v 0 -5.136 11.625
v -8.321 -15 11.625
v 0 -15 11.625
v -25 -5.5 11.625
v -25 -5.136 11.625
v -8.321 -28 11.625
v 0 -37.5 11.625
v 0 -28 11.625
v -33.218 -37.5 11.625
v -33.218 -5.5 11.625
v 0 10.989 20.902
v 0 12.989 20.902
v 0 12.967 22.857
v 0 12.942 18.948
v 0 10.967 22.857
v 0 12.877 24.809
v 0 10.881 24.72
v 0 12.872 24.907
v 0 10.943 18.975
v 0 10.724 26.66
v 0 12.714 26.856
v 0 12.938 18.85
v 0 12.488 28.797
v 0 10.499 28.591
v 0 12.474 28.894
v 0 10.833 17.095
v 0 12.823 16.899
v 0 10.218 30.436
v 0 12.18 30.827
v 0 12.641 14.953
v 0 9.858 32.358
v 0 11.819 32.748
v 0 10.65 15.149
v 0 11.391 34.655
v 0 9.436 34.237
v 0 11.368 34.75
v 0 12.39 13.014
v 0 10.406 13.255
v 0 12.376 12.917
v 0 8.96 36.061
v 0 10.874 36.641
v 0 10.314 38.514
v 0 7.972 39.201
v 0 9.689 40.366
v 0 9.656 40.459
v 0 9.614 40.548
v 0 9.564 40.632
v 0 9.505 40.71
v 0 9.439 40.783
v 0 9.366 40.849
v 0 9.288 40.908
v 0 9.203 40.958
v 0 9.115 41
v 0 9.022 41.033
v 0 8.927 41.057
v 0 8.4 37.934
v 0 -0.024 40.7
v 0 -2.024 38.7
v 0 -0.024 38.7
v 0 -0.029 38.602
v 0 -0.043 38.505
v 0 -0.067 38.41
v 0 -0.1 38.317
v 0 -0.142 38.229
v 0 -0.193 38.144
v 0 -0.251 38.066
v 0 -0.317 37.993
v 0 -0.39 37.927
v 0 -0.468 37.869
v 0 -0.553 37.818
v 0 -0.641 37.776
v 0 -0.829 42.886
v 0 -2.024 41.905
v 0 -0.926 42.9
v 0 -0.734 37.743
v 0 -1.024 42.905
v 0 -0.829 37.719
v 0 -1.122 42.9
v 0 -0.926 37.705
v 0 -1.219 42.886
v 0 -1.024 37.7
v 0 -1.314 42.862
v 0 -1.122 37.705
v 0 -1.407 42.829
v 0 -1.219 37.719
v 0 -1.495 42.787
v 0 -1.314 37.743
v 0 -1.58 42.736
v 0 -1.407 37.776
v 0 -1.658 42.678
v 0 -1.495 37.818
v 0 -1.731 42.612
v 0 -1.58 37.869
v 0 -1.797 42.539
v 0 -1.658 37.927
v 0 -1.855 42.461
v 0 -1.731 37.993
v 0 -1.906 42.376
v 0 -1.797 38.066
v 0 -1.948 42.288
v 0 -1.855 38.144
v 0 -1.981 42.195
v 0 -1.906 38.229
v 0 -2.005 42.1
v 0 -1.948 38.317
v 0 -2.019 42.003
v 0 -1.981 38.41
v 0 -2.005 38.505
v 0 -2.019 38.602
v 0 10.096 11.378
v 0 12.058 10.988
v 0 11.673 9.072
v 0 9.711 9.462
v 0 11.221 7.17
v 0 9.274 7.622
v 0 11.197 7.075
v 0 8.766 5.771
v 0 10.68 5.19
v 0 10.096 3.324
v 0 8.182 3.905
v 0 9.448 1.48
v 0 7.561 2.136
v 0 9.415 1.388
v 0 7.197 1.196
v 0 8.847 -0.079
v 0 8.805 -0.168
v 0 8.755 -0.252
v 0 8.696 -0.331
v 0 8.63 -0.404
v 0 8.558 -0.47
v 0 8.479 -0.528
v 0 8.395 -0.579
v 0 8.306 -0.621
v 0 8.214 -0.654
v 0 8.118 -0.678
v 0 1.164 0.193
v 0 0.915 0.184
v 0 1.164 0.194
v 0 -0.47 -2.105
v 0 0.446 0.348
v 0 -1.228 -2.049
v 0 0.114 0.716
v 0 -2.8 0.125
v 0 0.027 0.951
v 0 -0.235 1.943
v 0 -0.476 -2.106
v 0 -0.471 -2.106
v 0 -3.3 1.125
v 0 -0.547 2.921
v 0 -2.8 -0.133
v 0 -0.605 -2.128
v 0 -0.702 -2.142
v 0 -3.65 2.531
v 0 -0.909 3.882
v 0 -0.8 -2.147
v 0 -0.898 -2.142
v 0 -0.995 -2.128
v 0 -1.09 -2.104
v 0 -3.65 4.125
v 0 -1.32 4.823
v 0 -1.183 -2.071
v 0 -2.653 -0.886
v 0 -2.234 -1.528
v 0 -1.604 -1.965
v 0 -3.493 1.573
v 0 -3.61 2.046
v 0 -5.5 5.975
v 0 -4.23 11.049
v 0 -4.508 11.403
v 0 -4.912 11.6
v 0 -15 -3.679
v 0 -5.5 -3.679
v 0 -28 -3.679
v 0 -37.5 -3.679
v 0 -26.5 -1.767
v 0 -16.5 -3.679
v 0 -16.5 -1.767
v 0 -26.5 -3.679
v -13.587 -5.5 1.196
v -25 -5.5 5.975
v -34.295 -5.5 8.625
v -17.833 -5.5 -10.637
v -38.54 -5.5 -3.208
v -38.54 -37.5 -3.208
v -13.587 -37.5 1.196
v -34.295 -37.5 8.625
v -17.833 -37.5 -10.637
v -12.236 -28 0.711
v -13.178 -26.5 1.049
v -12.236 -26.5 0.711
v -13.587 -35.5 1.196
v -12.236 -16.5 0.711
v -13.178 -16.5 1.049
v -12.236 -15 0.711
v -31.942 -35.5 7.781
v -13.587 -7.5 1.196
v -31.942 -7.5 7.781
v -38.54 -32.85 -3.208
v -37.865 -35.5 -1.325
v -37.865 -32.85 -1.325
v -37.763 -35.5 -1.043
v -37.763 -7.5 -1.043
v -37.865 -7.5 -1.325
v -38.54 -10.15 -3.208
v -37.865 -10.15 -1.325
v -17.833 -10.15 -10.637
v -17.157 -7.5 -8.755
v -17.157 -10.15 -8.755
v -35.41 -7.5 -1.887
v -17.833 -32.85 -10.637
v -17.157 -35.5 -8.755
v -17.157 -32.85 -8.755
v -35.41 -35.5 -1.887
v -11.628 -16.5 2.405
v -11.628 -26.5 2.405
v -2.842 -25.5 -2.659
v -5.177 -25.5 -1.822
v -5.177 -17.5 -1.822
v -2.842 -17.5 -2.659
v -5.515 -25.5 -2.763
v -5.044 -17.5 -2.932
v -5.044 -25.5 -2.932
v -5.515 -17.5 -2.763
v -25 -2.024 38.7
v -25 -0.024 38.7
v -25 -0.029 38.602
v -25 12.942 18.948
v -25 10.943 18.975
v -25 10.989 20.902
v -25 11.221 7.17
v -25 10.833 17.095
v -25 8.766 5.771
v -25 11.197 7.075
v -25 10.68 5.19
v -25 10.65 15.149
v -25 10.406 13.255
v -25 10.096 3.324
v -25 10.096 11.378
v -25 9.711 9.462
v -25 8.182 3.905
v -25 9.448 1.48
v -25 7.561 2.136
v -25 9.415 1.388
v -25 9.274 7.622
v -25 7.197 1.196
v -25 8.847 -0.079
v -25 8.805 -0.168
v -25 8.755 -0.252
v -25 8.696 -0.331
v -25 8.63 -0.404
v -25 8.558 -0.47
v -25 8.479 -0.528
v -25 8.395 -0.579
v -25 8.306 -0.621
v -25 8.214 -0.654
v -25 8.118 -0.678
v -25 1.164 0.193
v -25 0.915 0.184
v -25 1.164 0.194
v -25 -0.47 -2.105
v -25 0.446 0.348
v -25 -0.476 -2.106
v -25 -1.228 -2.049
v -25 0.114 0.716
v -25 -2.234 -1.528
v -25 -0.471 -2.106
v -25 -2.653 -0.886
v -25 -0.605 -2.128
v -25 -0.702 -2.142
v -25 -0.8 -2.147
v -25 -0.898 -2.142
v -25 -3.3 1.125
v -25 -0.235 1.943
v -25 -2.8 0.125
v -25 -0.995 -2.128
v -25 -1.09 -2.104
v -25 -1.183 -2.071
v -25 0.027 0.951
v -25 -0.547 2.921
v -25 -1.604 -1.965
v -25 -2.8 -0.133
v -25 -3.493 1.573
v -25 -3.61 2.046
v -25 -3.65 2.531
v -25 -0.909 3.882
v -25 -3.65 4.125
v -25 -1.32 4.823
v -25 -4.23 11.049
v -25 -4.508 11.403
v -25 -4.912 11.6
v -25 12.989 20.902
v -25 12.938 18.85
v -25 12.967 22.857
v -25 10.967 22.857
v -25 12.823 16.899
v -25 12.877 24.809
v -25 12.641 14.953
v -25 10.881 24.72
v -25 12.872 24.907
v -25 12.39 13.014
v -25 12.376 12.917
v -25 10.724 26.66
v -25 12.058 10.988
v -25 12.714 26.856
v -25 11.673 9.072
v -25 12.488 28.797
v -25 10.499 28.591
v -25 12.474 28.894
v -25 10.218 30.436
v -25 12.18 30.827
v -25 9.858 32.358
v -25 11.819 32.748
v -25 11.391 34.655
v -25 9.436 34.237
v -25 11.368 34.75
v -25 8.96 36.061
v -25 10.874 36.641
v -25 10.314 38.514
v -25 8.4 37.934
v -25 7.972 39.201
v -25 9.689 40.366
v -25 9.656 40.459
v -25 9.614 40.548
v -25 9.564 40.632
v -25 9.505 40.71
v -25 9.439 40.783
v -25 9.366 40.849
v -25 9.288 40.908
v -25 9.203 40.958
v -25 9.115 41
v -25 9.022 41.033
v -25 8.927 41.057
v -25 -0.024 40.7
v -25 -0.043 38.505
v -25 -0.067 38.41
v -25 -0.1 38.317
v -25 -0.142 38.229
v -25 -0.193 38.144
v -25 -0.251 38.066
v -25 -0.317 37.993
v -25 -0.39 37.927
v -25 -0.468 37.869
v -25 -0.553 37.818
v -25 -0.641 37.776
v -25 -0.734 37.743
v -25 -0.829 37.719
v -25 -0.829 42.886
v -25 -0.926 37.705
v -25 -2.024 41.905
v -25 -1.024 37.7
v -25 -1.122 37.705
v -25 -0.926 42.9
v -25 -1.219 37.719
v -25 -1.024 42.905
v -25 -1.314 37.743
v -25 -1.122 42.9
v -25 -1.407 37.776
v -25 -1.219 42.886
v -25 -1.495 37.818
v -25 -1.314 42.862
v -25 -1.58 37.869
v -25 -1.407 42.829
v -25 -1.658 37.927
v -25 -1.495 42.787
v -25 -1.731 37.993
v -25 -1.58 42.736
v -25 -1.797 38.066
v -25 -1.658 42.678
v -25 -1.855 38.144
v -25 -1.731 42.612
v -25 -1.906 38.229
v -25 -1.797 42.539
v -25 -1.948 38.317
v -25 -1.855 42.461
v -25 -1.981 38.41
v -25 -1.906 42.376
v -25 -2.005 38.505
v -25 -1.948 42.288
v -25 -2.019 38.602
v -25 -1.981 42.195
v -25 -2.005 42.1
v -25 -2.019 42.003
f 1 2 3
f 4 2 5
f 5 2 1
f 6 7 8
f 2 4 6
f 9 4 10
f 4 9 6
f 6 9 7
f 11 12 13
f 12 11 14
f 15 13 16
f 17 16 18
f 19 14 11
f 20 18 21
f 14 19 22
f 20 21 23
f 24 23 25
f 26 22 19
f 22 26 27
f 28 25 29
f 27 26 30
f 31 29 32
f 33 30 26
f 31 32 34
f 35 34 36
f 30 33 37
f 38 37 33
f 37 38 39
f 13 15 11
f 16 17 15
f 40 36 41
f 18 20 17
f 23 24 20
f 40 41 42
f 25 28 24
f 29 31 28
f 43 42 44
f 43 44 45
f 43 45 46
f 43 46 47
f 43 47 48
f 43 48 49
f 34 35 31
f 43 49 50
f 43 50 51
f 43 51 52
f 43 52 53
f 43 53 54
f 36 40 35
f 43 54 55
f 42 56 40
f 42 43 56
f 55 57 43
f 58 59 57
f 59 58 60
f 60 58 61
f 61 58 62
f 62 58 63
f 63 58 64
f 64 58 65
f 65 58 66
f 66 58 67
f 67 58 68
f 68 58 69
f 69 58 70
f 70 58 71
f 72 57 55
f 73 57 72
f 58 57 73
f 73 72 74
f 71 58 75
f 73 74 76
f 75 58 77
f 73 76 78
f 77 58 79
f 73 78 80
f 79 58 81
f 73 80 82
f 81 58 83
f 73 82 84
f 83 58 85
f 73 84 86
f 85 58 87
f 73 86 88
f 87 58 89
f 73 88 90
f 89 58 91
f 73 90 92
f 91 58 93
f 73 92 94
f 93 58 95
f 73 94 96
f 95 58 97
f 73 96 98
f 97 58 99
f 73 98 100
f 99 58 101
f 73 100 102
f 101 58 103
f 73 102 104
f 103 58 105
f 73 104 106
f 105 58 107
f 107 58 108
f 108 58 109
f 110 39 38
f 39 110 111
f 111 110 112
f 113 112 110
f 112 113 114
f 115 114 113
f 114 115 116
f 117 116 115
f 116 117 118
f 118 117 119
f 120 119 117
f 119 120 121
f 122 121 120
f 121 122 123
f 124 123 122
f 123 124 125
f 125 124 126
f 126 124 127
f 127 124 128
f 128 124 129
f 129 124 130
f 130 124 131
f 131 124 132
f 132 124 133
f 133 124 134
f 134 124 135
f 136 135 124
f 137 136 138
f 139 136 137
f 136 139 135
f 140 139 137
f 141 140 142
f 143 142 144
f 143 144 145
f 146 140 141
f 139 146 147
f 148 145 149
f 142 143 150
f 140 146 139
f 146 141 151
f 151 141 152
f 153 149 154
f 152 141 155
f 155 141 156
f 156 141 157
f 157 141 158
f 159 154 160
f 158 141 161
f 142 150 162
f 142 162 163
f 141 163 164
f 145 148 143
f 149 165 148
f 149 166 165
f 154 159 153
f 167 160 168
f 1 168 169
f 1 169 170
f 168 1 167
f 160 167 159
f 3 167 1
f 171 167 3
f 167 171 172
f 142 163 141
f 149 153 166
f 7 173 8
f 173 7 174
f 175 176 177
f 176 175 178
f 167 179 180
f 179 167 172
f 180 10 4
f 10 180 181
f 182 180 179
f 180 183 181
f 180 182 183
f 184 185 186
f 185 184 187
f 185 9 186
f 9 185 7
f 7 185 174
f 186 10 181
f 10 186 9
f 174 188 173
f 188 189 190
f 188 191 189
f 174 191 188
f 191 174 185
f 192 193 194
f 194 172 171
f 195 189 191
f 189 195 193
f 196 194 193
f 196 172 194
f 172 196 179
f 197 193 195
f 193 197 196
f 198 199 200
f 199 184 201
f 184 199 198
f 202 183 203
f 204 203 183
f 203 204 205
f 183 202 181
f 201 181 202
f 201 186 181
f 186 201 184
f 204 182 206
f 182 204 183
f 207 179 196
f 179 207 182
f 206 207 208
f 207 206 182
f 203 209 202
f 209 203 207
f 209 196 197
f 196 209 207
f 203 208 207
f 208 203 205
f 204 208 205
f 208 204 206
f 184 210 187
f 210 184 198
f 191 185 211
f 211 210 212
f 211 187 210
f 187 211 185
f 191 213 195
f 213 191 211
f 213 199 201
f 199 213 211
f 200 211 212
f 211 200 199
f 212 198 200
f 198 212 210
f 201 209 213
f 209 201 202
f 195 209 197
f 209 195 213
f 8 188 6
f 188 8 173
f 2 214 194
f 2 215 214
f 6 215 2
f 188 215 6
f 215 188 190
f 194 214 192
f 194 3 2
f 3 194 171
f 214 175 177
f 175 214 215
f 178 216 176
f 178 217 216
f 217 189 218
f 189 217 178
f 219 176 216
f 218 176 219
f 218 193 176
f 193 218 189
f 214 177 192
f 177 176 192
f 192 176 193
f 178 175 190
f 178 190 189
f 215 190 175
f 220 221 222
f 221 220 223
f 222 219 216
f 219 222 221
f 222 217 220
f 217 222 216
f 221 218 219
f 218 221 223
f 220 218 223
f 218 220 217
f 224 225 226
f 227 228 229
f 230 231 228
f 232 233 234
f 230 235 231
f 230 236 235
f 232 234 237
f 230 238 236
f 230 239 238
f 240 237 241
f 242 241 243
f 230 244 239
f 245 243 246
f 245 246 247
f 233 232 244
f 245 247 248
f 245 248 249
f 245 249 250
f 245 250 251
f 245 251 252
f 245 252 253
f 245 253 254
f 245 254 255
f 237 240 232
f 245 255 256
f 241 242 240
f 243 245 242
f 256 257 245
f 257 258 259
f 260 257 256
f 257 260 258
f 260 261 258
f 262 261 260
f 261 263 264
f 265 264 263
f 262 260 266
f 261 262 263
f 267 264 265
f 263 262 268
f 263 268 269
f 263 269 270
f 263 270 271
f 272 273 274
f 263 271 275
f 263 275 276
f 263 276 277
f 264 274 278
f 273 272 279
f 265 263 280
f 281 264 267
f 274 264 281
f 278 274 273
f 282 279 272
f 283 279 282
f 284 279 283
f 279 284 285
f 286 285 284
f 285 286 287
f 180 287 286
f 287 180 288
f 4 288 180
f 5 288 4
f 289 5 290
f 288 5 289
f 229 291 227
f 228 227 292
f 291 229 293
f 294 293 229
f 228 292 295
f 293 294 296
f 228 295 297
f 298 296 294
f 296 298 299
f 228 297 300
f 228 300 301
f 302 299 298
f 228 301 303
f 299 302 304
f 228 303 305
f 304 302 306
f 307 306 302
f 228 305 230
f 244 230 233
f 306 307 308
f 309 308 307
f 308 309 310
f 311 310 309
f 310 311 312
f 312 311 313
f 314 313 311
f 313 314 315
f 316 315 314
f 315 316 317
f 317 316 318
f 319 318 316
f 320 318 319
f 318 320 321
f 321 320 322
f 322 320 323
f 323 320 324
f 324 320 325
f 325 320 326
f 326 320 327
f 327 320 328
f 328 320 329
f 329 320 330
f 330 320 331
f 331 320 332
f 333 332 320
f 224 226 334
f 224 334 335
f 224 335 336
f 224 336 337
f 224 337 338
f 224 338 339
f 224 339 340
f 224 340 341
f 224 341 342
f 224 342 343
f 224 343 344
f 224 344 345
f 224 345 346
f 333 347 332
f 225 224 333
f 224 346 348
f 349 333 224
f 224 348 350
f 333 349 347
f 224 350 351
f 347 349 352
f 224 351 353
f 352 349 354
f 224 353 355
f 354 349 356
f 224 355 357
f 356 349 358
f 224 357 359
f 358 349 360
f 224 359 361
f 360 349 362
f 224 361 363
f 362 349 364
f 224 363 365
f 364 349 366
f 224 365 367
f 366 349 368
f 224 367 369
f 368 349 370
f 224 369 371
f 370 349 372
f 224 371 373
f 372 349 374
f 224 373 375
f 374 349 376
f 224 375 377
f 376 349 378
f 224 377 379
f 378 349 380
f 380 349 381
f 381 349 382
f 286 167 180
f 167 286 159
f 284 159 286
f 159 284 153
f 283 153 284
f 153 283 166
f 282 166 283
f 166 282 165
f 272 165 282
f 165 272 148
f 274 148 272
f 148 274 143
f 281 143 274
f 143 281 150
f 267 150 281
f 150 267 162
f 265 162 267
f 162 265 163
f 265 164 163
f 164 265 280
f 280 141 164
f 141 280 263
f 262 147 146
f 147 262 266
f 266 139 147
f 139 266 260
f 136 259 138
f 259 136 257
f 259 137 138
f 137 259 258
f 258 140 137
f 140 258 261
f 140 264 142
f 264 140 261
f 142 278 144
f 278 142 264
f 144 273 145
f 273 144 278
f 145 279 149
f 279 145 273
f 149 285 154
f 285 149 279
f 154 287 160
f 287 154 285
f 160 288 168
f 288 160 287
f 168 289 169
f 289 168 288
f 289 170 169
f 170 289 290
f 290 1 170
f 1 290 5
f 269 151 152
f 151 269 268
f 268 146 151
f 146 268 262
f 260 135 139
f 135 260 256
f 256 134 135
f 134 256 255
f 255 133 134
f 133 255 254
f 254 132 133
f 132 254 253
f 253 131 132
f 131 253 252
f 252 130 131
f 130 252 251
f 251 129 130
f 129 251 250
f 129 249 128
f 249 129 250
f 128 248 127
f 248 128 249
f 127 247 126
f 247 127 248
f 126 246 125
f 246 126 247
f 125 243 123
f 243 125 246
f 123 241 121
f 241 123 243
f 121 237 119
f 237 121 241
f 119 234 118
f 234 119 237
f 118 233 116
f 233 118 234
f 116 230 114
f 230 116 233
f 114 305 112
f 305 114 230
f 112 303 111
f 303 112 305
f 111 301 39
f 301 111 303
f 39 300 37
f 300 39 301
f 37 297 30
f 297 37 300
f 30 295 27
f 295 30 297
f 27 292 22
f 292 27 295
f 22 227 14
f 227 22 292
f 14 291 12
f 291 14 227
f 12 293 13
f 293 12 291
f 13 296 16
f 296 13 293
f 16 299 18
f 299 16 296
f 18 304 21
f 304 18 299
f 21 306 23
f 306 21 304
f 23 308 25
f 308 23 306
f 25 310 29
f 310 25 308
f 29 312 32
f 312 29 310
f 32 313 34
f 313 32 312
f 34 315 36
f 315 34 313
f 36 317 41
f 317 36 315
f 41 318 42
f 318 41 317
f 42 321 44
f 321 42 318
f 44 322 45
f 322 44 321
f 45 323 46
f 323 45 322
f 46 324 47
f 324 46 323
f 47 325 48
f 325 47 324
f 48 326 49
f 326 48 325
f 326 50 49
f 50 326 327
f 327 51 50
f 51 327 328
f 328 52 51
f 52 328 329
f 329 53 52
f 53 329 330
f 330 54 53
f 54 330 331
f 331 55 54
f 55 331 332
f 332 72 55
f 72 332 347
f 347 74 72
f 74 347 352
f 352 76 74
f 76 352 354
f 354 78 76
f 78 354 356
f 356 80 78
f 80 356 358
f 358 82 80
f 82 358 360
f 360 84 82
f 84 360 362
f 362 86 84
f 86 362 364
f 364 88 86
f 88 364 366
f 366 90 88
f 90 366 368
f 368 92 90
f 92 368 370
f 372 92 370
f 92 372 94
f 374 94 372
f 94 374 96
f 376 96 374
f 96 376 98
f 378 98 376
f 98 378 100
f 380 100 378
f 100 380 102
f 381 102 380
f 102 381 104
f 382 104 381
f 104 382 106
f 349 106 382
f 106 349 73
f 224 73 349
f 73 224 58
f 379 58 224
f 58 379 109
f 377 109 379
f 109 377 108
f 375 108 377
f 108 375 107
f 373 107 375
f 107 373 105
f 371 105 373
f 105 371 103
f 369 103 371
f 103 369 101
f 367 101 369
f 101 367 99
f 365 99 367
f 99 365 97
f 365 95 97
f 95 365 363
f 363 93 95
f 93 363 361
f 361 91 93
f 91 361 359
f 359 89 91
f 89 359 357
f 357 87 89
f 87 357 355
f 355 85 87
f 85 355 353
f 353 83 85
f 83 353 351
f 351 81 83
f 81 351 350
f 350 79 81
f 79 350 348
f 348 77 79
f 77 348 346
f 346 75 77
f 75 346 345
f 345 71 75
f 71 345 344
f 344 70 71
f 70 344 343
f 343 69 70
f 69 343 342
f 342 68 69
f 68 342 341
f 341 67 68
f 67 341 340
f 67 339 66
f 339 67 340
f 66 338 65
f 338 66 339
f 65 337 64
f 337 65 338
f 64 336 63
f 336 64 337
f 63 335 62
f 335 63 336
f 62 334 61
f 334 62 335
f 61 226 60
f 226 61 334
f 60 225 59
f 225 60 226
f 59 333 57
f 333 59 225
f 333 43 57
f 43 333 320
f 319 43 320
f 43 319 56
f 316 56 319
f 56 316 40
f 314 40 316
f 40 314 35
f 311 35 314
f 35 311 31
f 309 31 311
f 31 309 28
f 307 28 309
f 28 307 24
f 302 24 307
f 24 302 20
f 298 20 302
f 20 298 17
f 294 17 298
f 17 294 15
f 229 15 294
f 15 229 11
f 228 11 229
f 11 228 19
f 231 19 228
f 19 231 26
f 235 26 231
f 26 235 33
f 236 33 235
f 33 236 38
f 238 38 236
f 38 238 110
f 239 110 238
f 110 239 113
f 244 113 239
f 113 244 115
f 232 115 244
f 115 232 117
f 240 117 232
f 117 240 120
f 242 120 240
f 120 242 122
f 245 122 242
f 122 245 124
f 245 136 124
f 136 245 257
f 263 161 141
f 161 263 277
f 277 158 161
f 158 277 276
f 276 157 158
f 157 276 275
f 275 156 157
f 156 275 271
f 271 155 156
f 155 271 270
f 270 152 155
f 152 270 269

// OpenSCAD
// Light clip for the Thule Chariot Sport bike trailer.
// Rebuilt from Thule_HalterFischer.iges / .stl (original: clip + Fischer slide-in mount).
//
// Coordinates match the original STL: the part is an extrusion along X
// (0..clip_width), the cross-section lies in the Y/Z plane.
// Print it lying on the X=0 face (profile flat on the bed).

// which mount to build: "fischer" (original), "hiro50" or "none" (bare clip)
mount = "hiro50";
// show the original STL as transparent overlay for comparison
show_reference = false;

$fn = 64;

// ---------------------------------------------------------------- clip
clip_width = 25;
wall = 2;

// curved back of the clip (midline arc)
arc_center = [-44.01, 21.254];
arc_radius = 56;

// top lip with a downward hook at its free end
hook_tip = [-1.024, 38.7];
hook_top = [-1.024, 41.905];
top_lip_angle = -10.62;   // degrees, slope of the top lip
top_arc_angle = 19.64;    // where the top lip meets the arc

// bottom lip
bottom_lip_start = [-0.8, -1.147];
bottom_arc_angle = -21.97; // where the bottom lip meets the arc

function arc_point(a) = arc_center + arc_radius * [cos(a), sin(a)];

// path of the clip's wall midline
function clip_path() = concat(
    [hook_tip, hook_top],
    [for (a = [top_arc_angle : -2 : bottom_arc_angle]) arc_point(a)],
    [arc_point(bottom_arc_angle), bottom_lip_start]
);

// 2D stroke along a path with round joints
module stroke(path, width) {
    for (i = [0 : len(path) - 2])
        hull() {
            translate(path[i]) circle(d = width);
            translate(path[i + 1]) circle(d = width);
        }
}

// concave corners get a fillet
module fillet(r) {
    offset(r = -r) offset(delta = r) children();
}

module clip_profile() {
    stroke(clip_path(), wall);
}

// extrude a Y/Z profile along X
module extrude_x(length) {
    rotate([90, 0, 90]) linear_extrude(length) children();
}

// ---------------------------------------------------------------- Fischer mount
plate_y = [-24, -5.5];
plate_z = [6.125, 11.625];
pocket_z = [8.025, 10.125];   // slide-in pocket for the light's foot
pocket_y = [-22.5, -5.5];
pocket_depth = 20.76;
slot_width = 4;               // the two slots that free the spring tongue
slot_length = 11;
tongue_y = [-18.5, -9.5];
tongue_corner_r = 3;

// web connecting the bottom lip of the clip with the plate (y, z)
fischer_web_points = [
    [1.2, -1.0], [1.164, 0.194], [0.915, 0.184], [0.446, 0.348], [0.114, 0.716],
    [0.027, 0.951], [-0.235, 1.943], [-0.547, 2.921], [-0.909, 3.882], [-1.32, 4.823],
    [-4.23, 11.049], [-4.508, 11.403], [-4.912, 11.6], [-5.136, 11.625],
    [-5.5, 11.625], [-5.65, 6.125], [-3.65, 4.125], [-3.65, 2.531], [-3.61, 2.046],
    [-3.493, 1.573], [-3.3, 1.125], [-2.8, 0.125], [-2.8, -0.133],
    [-2.653, -0.886], [-2.234, -1.528], [-1.604, -1.965], [-0.855, -2.133], [-0.471, -2.106]
];

module fischer_plate_profile() {
    polygon(fischer_web_points);
    hull() {
        translate([plate_y[1] - 1, plate_z[0]]) square([1, plate_z[1] - plate_z[0]]);
        translate([plate_y[0] + 1, plate_z[1] - 1]) circle(r = 1);
        translate([plate_y[0] + 1, plate_z[0] + 0.76]) circle(r = 1);
    }
}

// cut-outs in the top layer: two slots around the spring tongue
module fischer_tongue_cut() {
    difference() {
        union() {
            translate([-1, pocket_y[0]]) square([slot_length + 1, pocket_y[1] - pocket_y[0]]);
            translate([slot_length, pocket_y[1] - slot_width / 2]) circle(d = slot_width);
            translate([slot_length, pocket_y[0] + slot_width / 2]) circle(d = slot_width);
        }
        hull() {
            translate([tongue_corner_r, tongue_y[1] - tongue_corner_r]) circle(r = tongue_corner_r);
            translate([tongue_corner_r, tongue_y[0] + tongue_corner_r]) circle(r = tongue_corner_r);
            translate([slot_length, tongue_y[0]]) square([5, tongue_y[1] - tongue_y[0]]);
        }
    }
}

// cut-out in the bottom layer (entry with flared corners + wider recess)
module fischer_bottom_cut() {
    // entry
    translate([-1, -19.95]) square([7.11, 11.9]);
    // flared corners at x = 0
    // (squares overlap the entry by 0.1 so no zero-width sliver remains)
    difference() {
        translate([-1, -8.15]) square([4, 3.1]);
        translate([3, -5.05]) circle(r = 3);
    }
    difference() {
        translate([-1, -22.95]) square([4, 3.1]);
        translate([3, -22.95]) circle(r = 3);
    }
    // recess
    hull() {
        translate([6.11, -20.35]) square([1, 12.7]);
        translate([17.61, -8.65]) circle(r = 1);
        translate([17.61, -19.35]) circle(r = 1);
    }
}

// small catch under the tip of the tongue
module fischer_latch() {
    hull() {
        translate([1.6, -16.1, pocket_z[1] + 1.13]) rotate([-90, 0, 0]) cylinder(r = 1.5, h = 4.2);
        translate([1.6, -17.4, pocket_z[1] + 0.5]) rotate([-90, 0, 0]) cylinder(r = 0.5, h = 6.8);
    }
}

module fischer_mount() {
    difference() {
        extrude_x(clip_width) fischer_plate_profile();
        // pocket
        translate([0, 0, pocket_z[0]]) linear_extrude(pocket_z[1] - pocket_z[0])
            hull() {
                translate([-1, pocket_y[0]]) square([1, pocket_y[1] - pocket_y[0]]);
                translate([pocket_depth - 1, pocket_y[1] - 1]) circle(r = 1);
                translate([pocket_depth - 1, pocket_y[0] + 1]) circle(r = 1);
            }
        translate([0, 0, pocket_z[1] - 0.01]) linear_extrude(plate_z[1] - pocket_z[1] + 1)
            fischer_tongue_cut();
        translate([0, 0, plate_z[0] - 1]) linear_extrude(pocket_z[0] - plate_z[0] + 1.01)
            fischer_bottom_cut();
    }
    intersection() {
        fischer_latch();
        translate([0, -30, pocket_z[0]]) cube([clip_width, 30, pocket_z[1] - pocket_z[0]]);
    }
}

// ---------------------------------------------------------------- Sigma Hiro 50 mount
// The Sigma bracket stays on the light (rubber strap removed). Its two ear
// flanges slide into C-rails, a spring tongue with a catch snaps behind the
// top end of the bracket. The light hangs below, LED facing -Z, its back
// parallel to the trailer rail (X); it slides in from X = 0, bottom end first.
// Lift the tongue tip at X = 0 to release the light.

// bracket, measured with calipers
hiro_bracket_length = 26.2;   // along the light's back
hiro_wedge_top = 4.7;         // light back -> pad surface, thin (top) end
hiro_wedge_bottom = 14.1;     // light back -> pad surface, thick (bottom) end
hiro_ear_inner = 24.7;        // between the two ear flanges
hiro_ear_outer = 27.4;        // across the two ear flanges
hiro_flange_length = 17.7;
hiro_flange_depth = 6.3;
hiro_flange_gap = 3.4;        // flange edge -> light back, at the bottom end
hiro_pad_width = 17.5;
// light body, estimated from photos (only used for the preview)
hiro_light_size = [63, 19.9, 20]; // length, width (measured), depth
hiro_light_top_overhang = 8;      // light beyond the top end of the bracket

// receiver
hiro_clearance = 0.3;
hiro_seat_gap = 0.2;          // between pad and seat (rubber pad)
hiro_lip = [1.0, 2];          // overlap under the flange, thickness
                              // (inner edges 22.7 apart, the light body must fit between)
hiro_side_wall = 2;
hiro_stop = 2.5;              // end stop thickness
hiro_body_min = 3;            // material above the seat at the deep end
hiro_tongue = [13, 10, 1.8];  // length, width, thickness
hiro_tongue_slot = 1.5;
hiro_nub = [2.5, 1];          // length, height of the catch
hiro_tab = 3;                 // finger tab in front of the catch
hiro_center_y = -5.5 - (hiro_ear_outer / 2 + hiro_clearance + hiro_side_wall);
hiro_top_z = plate_z[1];

// derived
hiro_angle = atan((hiro_wedge_bottom - hiro_wedge_top) / hiro_bracket_length);
hiro_half = hiro_ear_outer / 2 + hiro_clearance + hiro_side_wall;
hiro_pad_length = hiro_bracket_length / cos(hiro_angle);

// Receiver frame: origin on the pad surface at the bracket's bottom end,
// u (x) along the pad towards the deep end, v (y) across, w (z) away from the light.
// The bracket occupies u = -hiro_pad_length .. 0, w <= 0.
hiro_flange_edge_w = -(hiro_wedge_bottom - hiro_flange_gap) * cos(hiro_angle);
hiro_flange_top_w = hiro_flange_edge_w + hiro_flange_depth;
hiro_u_stop = hiro_clearance;
hiro_u_end = hiro_u_stop + hiro_stop;
hiro_u_nub = -hiro_pad_length - hiro_clearance;
hiro_u_entry = hiro_u_nub - hiro_nub[0] - hiro_tab;
hiro_u_rail = -hiro_flange_length - 1.5;
hiro_lip_w = hiro_flange_edge_w - hiro_clearance - hiro_lip[1];

hiro_origin = [
    -hiro_u_entry * cos(hiro_angle) + hiro_seat_gap * sin(hiro_angle),
    hiro_center_y,
    hiro_top_z - hiro_body_min - hiro_u_end * sin(hiro_angle) - hiro_seat_gap * cos(hiro_angle)
];

module hiro_frame() {
    translate(hiro_origin) rotate([0, -hiro_angle, 0]) children();
}

// wedge-shaped body above the seat, flat on top
module hiro_body() {
    intersection() {
        translate([0, hiro_center_y - hiro_half, -50]) cube([100, 2 * hiro_half, hiro_top_z + 50]);
        hiro_frame() translate([hiro_u_entry, -hiro_half, hiro_seat_gap])
            cube([hiro_u_end - hiro_u_entry, 2 * hiro_half, 100]);
    }
}

// C-rail around one ear flange (+v side)
module hiro_rail() {
    len = hiro_u_end - hiro_u_rail;
    flange_out = hiro_ear_outer / 2 + hiro_clearance;
    // side wall
    translate([hiro_u_rail, flange_out, hiro_lip_w])
        cube([len, hiro_side_wall, hiro_seat_gap - hiro_lip_w + 0.5]);
    // lip under the flange
    translate([hiro_u_rail, hiro_ear_inner / 2 - hiro_lip[0], hiro_lip_w])
        cube([len, flange_out - hiro_ear_inner / 2 + hiro_lip[0] + 0.01, hiro_lip[1]]);
}

module hiro_receiver() {
    difference() {
        union() {
            hiro_body();
            hiro_frame() {
                hiro_rail();
                mirror([0, 1, 0]) hiro_rail();
                // end stop
                translate([hiro_u_stop, -hiro_half, hiro_flange_edge_w])
                    cube([hiro_stop, 2 * hiro_half, hiro_seat_gap - hiro_flange_edge_w + 0.5]);
            }
        }
        // free the spring tongue
        hiro_frame() translate([hiro_u_entry - 1, -(hiro_tongue[1] / 2 + hiro_tongue_slot), hiro_seat_gap - 1])
            cube([hiro_tongue[0] + 1, hiro_tongue[1] + 2 * hiro_tongue_slot, 100]);
    }
    hiro_frame() {
        translate([hiro_u_entry, -hiro_tongue[1] / 2, hiro_seat_gap])
            cube([hiro_tongue[0] + 1, hiro_tongue[1], hiro_tongue[2]]);
        // catch, ramp towards the entry
        rotate([90, 0, 0]) linear_extrude(hiro_tongue[1] - 2, center = true)
            polygon([
                [hiro_u_nub, hiro_seat_gap + 0.01],
                [hiro_u_nub, hiro_seat_gap - hiro_nub[1]],
                [hiro_u_nub - 0.5, hiro_seat_gap - hiro_nub[1]],
                [hiro_u_nub - hiro_nub[0], hiro_seat_gap + 0.01]
            ]);
    }
}

module hiro50_mount() {
    // web from the clip to the receiver
    extrude_x(clip_width) {
        polygon(fischer_web_points);
        translate([-7, plate_z[0]]) square([1.6, plate_z[1] - plate_z[0]]);
    }
    intersection() {
        hiro_receiver();
        translate([0, -100, -100]) cube(200);
    }
}

// light with bracket, for the preview only
module hiro_light() {
    a = hiro_angle;
    translate(hiro_origin - [0, 0, hiro_wedge_bottom]) {
        translate([hiro_light_top_overhang * -1 - hiro_bracket_length, -hiro_light_size[1] / 2, -hiro_light_size[2]])
            cube(hiro_light_size);
        rotate([90, 0, 0]) linear_extrude(hiro_pad_width, center = true)
            polygon([[0, 0], [0, hiro_wedge_bottom], [-hiro_bracket_length, hiro_wedge_top], [-hiro_bracket_length, 0]]);
    }
    hiro_frame() for (m = [0, 1]) mirror([0, m, 0])
        translate([-hiro_flange_length, hiro_ear_inner / 2, hiro_flange_edge_w])
            cube([hiro_flange_length, (hiro_ear_outer - hiro_ear_inner) / 2, hiro_flange_depth]);
}

// ---------------------------------------------------------------- assembly
// side: "left" or "right" (mirrored), for the two sides of the trailer
side = "right";
show_light = false;

mirror([side == "right" ? 1 : 0, 0, 0]) {
    extrude_x(clip_width) clip_profile();

    if (mount == "fischer") fischer_mount();
    if (mount == "hiro50") hiro50_mount();

    if (show_reference) %import("Thule_HalterFischer.stl");
    if (show_light && mount == "hiro50") %hiro_light();
}
 
